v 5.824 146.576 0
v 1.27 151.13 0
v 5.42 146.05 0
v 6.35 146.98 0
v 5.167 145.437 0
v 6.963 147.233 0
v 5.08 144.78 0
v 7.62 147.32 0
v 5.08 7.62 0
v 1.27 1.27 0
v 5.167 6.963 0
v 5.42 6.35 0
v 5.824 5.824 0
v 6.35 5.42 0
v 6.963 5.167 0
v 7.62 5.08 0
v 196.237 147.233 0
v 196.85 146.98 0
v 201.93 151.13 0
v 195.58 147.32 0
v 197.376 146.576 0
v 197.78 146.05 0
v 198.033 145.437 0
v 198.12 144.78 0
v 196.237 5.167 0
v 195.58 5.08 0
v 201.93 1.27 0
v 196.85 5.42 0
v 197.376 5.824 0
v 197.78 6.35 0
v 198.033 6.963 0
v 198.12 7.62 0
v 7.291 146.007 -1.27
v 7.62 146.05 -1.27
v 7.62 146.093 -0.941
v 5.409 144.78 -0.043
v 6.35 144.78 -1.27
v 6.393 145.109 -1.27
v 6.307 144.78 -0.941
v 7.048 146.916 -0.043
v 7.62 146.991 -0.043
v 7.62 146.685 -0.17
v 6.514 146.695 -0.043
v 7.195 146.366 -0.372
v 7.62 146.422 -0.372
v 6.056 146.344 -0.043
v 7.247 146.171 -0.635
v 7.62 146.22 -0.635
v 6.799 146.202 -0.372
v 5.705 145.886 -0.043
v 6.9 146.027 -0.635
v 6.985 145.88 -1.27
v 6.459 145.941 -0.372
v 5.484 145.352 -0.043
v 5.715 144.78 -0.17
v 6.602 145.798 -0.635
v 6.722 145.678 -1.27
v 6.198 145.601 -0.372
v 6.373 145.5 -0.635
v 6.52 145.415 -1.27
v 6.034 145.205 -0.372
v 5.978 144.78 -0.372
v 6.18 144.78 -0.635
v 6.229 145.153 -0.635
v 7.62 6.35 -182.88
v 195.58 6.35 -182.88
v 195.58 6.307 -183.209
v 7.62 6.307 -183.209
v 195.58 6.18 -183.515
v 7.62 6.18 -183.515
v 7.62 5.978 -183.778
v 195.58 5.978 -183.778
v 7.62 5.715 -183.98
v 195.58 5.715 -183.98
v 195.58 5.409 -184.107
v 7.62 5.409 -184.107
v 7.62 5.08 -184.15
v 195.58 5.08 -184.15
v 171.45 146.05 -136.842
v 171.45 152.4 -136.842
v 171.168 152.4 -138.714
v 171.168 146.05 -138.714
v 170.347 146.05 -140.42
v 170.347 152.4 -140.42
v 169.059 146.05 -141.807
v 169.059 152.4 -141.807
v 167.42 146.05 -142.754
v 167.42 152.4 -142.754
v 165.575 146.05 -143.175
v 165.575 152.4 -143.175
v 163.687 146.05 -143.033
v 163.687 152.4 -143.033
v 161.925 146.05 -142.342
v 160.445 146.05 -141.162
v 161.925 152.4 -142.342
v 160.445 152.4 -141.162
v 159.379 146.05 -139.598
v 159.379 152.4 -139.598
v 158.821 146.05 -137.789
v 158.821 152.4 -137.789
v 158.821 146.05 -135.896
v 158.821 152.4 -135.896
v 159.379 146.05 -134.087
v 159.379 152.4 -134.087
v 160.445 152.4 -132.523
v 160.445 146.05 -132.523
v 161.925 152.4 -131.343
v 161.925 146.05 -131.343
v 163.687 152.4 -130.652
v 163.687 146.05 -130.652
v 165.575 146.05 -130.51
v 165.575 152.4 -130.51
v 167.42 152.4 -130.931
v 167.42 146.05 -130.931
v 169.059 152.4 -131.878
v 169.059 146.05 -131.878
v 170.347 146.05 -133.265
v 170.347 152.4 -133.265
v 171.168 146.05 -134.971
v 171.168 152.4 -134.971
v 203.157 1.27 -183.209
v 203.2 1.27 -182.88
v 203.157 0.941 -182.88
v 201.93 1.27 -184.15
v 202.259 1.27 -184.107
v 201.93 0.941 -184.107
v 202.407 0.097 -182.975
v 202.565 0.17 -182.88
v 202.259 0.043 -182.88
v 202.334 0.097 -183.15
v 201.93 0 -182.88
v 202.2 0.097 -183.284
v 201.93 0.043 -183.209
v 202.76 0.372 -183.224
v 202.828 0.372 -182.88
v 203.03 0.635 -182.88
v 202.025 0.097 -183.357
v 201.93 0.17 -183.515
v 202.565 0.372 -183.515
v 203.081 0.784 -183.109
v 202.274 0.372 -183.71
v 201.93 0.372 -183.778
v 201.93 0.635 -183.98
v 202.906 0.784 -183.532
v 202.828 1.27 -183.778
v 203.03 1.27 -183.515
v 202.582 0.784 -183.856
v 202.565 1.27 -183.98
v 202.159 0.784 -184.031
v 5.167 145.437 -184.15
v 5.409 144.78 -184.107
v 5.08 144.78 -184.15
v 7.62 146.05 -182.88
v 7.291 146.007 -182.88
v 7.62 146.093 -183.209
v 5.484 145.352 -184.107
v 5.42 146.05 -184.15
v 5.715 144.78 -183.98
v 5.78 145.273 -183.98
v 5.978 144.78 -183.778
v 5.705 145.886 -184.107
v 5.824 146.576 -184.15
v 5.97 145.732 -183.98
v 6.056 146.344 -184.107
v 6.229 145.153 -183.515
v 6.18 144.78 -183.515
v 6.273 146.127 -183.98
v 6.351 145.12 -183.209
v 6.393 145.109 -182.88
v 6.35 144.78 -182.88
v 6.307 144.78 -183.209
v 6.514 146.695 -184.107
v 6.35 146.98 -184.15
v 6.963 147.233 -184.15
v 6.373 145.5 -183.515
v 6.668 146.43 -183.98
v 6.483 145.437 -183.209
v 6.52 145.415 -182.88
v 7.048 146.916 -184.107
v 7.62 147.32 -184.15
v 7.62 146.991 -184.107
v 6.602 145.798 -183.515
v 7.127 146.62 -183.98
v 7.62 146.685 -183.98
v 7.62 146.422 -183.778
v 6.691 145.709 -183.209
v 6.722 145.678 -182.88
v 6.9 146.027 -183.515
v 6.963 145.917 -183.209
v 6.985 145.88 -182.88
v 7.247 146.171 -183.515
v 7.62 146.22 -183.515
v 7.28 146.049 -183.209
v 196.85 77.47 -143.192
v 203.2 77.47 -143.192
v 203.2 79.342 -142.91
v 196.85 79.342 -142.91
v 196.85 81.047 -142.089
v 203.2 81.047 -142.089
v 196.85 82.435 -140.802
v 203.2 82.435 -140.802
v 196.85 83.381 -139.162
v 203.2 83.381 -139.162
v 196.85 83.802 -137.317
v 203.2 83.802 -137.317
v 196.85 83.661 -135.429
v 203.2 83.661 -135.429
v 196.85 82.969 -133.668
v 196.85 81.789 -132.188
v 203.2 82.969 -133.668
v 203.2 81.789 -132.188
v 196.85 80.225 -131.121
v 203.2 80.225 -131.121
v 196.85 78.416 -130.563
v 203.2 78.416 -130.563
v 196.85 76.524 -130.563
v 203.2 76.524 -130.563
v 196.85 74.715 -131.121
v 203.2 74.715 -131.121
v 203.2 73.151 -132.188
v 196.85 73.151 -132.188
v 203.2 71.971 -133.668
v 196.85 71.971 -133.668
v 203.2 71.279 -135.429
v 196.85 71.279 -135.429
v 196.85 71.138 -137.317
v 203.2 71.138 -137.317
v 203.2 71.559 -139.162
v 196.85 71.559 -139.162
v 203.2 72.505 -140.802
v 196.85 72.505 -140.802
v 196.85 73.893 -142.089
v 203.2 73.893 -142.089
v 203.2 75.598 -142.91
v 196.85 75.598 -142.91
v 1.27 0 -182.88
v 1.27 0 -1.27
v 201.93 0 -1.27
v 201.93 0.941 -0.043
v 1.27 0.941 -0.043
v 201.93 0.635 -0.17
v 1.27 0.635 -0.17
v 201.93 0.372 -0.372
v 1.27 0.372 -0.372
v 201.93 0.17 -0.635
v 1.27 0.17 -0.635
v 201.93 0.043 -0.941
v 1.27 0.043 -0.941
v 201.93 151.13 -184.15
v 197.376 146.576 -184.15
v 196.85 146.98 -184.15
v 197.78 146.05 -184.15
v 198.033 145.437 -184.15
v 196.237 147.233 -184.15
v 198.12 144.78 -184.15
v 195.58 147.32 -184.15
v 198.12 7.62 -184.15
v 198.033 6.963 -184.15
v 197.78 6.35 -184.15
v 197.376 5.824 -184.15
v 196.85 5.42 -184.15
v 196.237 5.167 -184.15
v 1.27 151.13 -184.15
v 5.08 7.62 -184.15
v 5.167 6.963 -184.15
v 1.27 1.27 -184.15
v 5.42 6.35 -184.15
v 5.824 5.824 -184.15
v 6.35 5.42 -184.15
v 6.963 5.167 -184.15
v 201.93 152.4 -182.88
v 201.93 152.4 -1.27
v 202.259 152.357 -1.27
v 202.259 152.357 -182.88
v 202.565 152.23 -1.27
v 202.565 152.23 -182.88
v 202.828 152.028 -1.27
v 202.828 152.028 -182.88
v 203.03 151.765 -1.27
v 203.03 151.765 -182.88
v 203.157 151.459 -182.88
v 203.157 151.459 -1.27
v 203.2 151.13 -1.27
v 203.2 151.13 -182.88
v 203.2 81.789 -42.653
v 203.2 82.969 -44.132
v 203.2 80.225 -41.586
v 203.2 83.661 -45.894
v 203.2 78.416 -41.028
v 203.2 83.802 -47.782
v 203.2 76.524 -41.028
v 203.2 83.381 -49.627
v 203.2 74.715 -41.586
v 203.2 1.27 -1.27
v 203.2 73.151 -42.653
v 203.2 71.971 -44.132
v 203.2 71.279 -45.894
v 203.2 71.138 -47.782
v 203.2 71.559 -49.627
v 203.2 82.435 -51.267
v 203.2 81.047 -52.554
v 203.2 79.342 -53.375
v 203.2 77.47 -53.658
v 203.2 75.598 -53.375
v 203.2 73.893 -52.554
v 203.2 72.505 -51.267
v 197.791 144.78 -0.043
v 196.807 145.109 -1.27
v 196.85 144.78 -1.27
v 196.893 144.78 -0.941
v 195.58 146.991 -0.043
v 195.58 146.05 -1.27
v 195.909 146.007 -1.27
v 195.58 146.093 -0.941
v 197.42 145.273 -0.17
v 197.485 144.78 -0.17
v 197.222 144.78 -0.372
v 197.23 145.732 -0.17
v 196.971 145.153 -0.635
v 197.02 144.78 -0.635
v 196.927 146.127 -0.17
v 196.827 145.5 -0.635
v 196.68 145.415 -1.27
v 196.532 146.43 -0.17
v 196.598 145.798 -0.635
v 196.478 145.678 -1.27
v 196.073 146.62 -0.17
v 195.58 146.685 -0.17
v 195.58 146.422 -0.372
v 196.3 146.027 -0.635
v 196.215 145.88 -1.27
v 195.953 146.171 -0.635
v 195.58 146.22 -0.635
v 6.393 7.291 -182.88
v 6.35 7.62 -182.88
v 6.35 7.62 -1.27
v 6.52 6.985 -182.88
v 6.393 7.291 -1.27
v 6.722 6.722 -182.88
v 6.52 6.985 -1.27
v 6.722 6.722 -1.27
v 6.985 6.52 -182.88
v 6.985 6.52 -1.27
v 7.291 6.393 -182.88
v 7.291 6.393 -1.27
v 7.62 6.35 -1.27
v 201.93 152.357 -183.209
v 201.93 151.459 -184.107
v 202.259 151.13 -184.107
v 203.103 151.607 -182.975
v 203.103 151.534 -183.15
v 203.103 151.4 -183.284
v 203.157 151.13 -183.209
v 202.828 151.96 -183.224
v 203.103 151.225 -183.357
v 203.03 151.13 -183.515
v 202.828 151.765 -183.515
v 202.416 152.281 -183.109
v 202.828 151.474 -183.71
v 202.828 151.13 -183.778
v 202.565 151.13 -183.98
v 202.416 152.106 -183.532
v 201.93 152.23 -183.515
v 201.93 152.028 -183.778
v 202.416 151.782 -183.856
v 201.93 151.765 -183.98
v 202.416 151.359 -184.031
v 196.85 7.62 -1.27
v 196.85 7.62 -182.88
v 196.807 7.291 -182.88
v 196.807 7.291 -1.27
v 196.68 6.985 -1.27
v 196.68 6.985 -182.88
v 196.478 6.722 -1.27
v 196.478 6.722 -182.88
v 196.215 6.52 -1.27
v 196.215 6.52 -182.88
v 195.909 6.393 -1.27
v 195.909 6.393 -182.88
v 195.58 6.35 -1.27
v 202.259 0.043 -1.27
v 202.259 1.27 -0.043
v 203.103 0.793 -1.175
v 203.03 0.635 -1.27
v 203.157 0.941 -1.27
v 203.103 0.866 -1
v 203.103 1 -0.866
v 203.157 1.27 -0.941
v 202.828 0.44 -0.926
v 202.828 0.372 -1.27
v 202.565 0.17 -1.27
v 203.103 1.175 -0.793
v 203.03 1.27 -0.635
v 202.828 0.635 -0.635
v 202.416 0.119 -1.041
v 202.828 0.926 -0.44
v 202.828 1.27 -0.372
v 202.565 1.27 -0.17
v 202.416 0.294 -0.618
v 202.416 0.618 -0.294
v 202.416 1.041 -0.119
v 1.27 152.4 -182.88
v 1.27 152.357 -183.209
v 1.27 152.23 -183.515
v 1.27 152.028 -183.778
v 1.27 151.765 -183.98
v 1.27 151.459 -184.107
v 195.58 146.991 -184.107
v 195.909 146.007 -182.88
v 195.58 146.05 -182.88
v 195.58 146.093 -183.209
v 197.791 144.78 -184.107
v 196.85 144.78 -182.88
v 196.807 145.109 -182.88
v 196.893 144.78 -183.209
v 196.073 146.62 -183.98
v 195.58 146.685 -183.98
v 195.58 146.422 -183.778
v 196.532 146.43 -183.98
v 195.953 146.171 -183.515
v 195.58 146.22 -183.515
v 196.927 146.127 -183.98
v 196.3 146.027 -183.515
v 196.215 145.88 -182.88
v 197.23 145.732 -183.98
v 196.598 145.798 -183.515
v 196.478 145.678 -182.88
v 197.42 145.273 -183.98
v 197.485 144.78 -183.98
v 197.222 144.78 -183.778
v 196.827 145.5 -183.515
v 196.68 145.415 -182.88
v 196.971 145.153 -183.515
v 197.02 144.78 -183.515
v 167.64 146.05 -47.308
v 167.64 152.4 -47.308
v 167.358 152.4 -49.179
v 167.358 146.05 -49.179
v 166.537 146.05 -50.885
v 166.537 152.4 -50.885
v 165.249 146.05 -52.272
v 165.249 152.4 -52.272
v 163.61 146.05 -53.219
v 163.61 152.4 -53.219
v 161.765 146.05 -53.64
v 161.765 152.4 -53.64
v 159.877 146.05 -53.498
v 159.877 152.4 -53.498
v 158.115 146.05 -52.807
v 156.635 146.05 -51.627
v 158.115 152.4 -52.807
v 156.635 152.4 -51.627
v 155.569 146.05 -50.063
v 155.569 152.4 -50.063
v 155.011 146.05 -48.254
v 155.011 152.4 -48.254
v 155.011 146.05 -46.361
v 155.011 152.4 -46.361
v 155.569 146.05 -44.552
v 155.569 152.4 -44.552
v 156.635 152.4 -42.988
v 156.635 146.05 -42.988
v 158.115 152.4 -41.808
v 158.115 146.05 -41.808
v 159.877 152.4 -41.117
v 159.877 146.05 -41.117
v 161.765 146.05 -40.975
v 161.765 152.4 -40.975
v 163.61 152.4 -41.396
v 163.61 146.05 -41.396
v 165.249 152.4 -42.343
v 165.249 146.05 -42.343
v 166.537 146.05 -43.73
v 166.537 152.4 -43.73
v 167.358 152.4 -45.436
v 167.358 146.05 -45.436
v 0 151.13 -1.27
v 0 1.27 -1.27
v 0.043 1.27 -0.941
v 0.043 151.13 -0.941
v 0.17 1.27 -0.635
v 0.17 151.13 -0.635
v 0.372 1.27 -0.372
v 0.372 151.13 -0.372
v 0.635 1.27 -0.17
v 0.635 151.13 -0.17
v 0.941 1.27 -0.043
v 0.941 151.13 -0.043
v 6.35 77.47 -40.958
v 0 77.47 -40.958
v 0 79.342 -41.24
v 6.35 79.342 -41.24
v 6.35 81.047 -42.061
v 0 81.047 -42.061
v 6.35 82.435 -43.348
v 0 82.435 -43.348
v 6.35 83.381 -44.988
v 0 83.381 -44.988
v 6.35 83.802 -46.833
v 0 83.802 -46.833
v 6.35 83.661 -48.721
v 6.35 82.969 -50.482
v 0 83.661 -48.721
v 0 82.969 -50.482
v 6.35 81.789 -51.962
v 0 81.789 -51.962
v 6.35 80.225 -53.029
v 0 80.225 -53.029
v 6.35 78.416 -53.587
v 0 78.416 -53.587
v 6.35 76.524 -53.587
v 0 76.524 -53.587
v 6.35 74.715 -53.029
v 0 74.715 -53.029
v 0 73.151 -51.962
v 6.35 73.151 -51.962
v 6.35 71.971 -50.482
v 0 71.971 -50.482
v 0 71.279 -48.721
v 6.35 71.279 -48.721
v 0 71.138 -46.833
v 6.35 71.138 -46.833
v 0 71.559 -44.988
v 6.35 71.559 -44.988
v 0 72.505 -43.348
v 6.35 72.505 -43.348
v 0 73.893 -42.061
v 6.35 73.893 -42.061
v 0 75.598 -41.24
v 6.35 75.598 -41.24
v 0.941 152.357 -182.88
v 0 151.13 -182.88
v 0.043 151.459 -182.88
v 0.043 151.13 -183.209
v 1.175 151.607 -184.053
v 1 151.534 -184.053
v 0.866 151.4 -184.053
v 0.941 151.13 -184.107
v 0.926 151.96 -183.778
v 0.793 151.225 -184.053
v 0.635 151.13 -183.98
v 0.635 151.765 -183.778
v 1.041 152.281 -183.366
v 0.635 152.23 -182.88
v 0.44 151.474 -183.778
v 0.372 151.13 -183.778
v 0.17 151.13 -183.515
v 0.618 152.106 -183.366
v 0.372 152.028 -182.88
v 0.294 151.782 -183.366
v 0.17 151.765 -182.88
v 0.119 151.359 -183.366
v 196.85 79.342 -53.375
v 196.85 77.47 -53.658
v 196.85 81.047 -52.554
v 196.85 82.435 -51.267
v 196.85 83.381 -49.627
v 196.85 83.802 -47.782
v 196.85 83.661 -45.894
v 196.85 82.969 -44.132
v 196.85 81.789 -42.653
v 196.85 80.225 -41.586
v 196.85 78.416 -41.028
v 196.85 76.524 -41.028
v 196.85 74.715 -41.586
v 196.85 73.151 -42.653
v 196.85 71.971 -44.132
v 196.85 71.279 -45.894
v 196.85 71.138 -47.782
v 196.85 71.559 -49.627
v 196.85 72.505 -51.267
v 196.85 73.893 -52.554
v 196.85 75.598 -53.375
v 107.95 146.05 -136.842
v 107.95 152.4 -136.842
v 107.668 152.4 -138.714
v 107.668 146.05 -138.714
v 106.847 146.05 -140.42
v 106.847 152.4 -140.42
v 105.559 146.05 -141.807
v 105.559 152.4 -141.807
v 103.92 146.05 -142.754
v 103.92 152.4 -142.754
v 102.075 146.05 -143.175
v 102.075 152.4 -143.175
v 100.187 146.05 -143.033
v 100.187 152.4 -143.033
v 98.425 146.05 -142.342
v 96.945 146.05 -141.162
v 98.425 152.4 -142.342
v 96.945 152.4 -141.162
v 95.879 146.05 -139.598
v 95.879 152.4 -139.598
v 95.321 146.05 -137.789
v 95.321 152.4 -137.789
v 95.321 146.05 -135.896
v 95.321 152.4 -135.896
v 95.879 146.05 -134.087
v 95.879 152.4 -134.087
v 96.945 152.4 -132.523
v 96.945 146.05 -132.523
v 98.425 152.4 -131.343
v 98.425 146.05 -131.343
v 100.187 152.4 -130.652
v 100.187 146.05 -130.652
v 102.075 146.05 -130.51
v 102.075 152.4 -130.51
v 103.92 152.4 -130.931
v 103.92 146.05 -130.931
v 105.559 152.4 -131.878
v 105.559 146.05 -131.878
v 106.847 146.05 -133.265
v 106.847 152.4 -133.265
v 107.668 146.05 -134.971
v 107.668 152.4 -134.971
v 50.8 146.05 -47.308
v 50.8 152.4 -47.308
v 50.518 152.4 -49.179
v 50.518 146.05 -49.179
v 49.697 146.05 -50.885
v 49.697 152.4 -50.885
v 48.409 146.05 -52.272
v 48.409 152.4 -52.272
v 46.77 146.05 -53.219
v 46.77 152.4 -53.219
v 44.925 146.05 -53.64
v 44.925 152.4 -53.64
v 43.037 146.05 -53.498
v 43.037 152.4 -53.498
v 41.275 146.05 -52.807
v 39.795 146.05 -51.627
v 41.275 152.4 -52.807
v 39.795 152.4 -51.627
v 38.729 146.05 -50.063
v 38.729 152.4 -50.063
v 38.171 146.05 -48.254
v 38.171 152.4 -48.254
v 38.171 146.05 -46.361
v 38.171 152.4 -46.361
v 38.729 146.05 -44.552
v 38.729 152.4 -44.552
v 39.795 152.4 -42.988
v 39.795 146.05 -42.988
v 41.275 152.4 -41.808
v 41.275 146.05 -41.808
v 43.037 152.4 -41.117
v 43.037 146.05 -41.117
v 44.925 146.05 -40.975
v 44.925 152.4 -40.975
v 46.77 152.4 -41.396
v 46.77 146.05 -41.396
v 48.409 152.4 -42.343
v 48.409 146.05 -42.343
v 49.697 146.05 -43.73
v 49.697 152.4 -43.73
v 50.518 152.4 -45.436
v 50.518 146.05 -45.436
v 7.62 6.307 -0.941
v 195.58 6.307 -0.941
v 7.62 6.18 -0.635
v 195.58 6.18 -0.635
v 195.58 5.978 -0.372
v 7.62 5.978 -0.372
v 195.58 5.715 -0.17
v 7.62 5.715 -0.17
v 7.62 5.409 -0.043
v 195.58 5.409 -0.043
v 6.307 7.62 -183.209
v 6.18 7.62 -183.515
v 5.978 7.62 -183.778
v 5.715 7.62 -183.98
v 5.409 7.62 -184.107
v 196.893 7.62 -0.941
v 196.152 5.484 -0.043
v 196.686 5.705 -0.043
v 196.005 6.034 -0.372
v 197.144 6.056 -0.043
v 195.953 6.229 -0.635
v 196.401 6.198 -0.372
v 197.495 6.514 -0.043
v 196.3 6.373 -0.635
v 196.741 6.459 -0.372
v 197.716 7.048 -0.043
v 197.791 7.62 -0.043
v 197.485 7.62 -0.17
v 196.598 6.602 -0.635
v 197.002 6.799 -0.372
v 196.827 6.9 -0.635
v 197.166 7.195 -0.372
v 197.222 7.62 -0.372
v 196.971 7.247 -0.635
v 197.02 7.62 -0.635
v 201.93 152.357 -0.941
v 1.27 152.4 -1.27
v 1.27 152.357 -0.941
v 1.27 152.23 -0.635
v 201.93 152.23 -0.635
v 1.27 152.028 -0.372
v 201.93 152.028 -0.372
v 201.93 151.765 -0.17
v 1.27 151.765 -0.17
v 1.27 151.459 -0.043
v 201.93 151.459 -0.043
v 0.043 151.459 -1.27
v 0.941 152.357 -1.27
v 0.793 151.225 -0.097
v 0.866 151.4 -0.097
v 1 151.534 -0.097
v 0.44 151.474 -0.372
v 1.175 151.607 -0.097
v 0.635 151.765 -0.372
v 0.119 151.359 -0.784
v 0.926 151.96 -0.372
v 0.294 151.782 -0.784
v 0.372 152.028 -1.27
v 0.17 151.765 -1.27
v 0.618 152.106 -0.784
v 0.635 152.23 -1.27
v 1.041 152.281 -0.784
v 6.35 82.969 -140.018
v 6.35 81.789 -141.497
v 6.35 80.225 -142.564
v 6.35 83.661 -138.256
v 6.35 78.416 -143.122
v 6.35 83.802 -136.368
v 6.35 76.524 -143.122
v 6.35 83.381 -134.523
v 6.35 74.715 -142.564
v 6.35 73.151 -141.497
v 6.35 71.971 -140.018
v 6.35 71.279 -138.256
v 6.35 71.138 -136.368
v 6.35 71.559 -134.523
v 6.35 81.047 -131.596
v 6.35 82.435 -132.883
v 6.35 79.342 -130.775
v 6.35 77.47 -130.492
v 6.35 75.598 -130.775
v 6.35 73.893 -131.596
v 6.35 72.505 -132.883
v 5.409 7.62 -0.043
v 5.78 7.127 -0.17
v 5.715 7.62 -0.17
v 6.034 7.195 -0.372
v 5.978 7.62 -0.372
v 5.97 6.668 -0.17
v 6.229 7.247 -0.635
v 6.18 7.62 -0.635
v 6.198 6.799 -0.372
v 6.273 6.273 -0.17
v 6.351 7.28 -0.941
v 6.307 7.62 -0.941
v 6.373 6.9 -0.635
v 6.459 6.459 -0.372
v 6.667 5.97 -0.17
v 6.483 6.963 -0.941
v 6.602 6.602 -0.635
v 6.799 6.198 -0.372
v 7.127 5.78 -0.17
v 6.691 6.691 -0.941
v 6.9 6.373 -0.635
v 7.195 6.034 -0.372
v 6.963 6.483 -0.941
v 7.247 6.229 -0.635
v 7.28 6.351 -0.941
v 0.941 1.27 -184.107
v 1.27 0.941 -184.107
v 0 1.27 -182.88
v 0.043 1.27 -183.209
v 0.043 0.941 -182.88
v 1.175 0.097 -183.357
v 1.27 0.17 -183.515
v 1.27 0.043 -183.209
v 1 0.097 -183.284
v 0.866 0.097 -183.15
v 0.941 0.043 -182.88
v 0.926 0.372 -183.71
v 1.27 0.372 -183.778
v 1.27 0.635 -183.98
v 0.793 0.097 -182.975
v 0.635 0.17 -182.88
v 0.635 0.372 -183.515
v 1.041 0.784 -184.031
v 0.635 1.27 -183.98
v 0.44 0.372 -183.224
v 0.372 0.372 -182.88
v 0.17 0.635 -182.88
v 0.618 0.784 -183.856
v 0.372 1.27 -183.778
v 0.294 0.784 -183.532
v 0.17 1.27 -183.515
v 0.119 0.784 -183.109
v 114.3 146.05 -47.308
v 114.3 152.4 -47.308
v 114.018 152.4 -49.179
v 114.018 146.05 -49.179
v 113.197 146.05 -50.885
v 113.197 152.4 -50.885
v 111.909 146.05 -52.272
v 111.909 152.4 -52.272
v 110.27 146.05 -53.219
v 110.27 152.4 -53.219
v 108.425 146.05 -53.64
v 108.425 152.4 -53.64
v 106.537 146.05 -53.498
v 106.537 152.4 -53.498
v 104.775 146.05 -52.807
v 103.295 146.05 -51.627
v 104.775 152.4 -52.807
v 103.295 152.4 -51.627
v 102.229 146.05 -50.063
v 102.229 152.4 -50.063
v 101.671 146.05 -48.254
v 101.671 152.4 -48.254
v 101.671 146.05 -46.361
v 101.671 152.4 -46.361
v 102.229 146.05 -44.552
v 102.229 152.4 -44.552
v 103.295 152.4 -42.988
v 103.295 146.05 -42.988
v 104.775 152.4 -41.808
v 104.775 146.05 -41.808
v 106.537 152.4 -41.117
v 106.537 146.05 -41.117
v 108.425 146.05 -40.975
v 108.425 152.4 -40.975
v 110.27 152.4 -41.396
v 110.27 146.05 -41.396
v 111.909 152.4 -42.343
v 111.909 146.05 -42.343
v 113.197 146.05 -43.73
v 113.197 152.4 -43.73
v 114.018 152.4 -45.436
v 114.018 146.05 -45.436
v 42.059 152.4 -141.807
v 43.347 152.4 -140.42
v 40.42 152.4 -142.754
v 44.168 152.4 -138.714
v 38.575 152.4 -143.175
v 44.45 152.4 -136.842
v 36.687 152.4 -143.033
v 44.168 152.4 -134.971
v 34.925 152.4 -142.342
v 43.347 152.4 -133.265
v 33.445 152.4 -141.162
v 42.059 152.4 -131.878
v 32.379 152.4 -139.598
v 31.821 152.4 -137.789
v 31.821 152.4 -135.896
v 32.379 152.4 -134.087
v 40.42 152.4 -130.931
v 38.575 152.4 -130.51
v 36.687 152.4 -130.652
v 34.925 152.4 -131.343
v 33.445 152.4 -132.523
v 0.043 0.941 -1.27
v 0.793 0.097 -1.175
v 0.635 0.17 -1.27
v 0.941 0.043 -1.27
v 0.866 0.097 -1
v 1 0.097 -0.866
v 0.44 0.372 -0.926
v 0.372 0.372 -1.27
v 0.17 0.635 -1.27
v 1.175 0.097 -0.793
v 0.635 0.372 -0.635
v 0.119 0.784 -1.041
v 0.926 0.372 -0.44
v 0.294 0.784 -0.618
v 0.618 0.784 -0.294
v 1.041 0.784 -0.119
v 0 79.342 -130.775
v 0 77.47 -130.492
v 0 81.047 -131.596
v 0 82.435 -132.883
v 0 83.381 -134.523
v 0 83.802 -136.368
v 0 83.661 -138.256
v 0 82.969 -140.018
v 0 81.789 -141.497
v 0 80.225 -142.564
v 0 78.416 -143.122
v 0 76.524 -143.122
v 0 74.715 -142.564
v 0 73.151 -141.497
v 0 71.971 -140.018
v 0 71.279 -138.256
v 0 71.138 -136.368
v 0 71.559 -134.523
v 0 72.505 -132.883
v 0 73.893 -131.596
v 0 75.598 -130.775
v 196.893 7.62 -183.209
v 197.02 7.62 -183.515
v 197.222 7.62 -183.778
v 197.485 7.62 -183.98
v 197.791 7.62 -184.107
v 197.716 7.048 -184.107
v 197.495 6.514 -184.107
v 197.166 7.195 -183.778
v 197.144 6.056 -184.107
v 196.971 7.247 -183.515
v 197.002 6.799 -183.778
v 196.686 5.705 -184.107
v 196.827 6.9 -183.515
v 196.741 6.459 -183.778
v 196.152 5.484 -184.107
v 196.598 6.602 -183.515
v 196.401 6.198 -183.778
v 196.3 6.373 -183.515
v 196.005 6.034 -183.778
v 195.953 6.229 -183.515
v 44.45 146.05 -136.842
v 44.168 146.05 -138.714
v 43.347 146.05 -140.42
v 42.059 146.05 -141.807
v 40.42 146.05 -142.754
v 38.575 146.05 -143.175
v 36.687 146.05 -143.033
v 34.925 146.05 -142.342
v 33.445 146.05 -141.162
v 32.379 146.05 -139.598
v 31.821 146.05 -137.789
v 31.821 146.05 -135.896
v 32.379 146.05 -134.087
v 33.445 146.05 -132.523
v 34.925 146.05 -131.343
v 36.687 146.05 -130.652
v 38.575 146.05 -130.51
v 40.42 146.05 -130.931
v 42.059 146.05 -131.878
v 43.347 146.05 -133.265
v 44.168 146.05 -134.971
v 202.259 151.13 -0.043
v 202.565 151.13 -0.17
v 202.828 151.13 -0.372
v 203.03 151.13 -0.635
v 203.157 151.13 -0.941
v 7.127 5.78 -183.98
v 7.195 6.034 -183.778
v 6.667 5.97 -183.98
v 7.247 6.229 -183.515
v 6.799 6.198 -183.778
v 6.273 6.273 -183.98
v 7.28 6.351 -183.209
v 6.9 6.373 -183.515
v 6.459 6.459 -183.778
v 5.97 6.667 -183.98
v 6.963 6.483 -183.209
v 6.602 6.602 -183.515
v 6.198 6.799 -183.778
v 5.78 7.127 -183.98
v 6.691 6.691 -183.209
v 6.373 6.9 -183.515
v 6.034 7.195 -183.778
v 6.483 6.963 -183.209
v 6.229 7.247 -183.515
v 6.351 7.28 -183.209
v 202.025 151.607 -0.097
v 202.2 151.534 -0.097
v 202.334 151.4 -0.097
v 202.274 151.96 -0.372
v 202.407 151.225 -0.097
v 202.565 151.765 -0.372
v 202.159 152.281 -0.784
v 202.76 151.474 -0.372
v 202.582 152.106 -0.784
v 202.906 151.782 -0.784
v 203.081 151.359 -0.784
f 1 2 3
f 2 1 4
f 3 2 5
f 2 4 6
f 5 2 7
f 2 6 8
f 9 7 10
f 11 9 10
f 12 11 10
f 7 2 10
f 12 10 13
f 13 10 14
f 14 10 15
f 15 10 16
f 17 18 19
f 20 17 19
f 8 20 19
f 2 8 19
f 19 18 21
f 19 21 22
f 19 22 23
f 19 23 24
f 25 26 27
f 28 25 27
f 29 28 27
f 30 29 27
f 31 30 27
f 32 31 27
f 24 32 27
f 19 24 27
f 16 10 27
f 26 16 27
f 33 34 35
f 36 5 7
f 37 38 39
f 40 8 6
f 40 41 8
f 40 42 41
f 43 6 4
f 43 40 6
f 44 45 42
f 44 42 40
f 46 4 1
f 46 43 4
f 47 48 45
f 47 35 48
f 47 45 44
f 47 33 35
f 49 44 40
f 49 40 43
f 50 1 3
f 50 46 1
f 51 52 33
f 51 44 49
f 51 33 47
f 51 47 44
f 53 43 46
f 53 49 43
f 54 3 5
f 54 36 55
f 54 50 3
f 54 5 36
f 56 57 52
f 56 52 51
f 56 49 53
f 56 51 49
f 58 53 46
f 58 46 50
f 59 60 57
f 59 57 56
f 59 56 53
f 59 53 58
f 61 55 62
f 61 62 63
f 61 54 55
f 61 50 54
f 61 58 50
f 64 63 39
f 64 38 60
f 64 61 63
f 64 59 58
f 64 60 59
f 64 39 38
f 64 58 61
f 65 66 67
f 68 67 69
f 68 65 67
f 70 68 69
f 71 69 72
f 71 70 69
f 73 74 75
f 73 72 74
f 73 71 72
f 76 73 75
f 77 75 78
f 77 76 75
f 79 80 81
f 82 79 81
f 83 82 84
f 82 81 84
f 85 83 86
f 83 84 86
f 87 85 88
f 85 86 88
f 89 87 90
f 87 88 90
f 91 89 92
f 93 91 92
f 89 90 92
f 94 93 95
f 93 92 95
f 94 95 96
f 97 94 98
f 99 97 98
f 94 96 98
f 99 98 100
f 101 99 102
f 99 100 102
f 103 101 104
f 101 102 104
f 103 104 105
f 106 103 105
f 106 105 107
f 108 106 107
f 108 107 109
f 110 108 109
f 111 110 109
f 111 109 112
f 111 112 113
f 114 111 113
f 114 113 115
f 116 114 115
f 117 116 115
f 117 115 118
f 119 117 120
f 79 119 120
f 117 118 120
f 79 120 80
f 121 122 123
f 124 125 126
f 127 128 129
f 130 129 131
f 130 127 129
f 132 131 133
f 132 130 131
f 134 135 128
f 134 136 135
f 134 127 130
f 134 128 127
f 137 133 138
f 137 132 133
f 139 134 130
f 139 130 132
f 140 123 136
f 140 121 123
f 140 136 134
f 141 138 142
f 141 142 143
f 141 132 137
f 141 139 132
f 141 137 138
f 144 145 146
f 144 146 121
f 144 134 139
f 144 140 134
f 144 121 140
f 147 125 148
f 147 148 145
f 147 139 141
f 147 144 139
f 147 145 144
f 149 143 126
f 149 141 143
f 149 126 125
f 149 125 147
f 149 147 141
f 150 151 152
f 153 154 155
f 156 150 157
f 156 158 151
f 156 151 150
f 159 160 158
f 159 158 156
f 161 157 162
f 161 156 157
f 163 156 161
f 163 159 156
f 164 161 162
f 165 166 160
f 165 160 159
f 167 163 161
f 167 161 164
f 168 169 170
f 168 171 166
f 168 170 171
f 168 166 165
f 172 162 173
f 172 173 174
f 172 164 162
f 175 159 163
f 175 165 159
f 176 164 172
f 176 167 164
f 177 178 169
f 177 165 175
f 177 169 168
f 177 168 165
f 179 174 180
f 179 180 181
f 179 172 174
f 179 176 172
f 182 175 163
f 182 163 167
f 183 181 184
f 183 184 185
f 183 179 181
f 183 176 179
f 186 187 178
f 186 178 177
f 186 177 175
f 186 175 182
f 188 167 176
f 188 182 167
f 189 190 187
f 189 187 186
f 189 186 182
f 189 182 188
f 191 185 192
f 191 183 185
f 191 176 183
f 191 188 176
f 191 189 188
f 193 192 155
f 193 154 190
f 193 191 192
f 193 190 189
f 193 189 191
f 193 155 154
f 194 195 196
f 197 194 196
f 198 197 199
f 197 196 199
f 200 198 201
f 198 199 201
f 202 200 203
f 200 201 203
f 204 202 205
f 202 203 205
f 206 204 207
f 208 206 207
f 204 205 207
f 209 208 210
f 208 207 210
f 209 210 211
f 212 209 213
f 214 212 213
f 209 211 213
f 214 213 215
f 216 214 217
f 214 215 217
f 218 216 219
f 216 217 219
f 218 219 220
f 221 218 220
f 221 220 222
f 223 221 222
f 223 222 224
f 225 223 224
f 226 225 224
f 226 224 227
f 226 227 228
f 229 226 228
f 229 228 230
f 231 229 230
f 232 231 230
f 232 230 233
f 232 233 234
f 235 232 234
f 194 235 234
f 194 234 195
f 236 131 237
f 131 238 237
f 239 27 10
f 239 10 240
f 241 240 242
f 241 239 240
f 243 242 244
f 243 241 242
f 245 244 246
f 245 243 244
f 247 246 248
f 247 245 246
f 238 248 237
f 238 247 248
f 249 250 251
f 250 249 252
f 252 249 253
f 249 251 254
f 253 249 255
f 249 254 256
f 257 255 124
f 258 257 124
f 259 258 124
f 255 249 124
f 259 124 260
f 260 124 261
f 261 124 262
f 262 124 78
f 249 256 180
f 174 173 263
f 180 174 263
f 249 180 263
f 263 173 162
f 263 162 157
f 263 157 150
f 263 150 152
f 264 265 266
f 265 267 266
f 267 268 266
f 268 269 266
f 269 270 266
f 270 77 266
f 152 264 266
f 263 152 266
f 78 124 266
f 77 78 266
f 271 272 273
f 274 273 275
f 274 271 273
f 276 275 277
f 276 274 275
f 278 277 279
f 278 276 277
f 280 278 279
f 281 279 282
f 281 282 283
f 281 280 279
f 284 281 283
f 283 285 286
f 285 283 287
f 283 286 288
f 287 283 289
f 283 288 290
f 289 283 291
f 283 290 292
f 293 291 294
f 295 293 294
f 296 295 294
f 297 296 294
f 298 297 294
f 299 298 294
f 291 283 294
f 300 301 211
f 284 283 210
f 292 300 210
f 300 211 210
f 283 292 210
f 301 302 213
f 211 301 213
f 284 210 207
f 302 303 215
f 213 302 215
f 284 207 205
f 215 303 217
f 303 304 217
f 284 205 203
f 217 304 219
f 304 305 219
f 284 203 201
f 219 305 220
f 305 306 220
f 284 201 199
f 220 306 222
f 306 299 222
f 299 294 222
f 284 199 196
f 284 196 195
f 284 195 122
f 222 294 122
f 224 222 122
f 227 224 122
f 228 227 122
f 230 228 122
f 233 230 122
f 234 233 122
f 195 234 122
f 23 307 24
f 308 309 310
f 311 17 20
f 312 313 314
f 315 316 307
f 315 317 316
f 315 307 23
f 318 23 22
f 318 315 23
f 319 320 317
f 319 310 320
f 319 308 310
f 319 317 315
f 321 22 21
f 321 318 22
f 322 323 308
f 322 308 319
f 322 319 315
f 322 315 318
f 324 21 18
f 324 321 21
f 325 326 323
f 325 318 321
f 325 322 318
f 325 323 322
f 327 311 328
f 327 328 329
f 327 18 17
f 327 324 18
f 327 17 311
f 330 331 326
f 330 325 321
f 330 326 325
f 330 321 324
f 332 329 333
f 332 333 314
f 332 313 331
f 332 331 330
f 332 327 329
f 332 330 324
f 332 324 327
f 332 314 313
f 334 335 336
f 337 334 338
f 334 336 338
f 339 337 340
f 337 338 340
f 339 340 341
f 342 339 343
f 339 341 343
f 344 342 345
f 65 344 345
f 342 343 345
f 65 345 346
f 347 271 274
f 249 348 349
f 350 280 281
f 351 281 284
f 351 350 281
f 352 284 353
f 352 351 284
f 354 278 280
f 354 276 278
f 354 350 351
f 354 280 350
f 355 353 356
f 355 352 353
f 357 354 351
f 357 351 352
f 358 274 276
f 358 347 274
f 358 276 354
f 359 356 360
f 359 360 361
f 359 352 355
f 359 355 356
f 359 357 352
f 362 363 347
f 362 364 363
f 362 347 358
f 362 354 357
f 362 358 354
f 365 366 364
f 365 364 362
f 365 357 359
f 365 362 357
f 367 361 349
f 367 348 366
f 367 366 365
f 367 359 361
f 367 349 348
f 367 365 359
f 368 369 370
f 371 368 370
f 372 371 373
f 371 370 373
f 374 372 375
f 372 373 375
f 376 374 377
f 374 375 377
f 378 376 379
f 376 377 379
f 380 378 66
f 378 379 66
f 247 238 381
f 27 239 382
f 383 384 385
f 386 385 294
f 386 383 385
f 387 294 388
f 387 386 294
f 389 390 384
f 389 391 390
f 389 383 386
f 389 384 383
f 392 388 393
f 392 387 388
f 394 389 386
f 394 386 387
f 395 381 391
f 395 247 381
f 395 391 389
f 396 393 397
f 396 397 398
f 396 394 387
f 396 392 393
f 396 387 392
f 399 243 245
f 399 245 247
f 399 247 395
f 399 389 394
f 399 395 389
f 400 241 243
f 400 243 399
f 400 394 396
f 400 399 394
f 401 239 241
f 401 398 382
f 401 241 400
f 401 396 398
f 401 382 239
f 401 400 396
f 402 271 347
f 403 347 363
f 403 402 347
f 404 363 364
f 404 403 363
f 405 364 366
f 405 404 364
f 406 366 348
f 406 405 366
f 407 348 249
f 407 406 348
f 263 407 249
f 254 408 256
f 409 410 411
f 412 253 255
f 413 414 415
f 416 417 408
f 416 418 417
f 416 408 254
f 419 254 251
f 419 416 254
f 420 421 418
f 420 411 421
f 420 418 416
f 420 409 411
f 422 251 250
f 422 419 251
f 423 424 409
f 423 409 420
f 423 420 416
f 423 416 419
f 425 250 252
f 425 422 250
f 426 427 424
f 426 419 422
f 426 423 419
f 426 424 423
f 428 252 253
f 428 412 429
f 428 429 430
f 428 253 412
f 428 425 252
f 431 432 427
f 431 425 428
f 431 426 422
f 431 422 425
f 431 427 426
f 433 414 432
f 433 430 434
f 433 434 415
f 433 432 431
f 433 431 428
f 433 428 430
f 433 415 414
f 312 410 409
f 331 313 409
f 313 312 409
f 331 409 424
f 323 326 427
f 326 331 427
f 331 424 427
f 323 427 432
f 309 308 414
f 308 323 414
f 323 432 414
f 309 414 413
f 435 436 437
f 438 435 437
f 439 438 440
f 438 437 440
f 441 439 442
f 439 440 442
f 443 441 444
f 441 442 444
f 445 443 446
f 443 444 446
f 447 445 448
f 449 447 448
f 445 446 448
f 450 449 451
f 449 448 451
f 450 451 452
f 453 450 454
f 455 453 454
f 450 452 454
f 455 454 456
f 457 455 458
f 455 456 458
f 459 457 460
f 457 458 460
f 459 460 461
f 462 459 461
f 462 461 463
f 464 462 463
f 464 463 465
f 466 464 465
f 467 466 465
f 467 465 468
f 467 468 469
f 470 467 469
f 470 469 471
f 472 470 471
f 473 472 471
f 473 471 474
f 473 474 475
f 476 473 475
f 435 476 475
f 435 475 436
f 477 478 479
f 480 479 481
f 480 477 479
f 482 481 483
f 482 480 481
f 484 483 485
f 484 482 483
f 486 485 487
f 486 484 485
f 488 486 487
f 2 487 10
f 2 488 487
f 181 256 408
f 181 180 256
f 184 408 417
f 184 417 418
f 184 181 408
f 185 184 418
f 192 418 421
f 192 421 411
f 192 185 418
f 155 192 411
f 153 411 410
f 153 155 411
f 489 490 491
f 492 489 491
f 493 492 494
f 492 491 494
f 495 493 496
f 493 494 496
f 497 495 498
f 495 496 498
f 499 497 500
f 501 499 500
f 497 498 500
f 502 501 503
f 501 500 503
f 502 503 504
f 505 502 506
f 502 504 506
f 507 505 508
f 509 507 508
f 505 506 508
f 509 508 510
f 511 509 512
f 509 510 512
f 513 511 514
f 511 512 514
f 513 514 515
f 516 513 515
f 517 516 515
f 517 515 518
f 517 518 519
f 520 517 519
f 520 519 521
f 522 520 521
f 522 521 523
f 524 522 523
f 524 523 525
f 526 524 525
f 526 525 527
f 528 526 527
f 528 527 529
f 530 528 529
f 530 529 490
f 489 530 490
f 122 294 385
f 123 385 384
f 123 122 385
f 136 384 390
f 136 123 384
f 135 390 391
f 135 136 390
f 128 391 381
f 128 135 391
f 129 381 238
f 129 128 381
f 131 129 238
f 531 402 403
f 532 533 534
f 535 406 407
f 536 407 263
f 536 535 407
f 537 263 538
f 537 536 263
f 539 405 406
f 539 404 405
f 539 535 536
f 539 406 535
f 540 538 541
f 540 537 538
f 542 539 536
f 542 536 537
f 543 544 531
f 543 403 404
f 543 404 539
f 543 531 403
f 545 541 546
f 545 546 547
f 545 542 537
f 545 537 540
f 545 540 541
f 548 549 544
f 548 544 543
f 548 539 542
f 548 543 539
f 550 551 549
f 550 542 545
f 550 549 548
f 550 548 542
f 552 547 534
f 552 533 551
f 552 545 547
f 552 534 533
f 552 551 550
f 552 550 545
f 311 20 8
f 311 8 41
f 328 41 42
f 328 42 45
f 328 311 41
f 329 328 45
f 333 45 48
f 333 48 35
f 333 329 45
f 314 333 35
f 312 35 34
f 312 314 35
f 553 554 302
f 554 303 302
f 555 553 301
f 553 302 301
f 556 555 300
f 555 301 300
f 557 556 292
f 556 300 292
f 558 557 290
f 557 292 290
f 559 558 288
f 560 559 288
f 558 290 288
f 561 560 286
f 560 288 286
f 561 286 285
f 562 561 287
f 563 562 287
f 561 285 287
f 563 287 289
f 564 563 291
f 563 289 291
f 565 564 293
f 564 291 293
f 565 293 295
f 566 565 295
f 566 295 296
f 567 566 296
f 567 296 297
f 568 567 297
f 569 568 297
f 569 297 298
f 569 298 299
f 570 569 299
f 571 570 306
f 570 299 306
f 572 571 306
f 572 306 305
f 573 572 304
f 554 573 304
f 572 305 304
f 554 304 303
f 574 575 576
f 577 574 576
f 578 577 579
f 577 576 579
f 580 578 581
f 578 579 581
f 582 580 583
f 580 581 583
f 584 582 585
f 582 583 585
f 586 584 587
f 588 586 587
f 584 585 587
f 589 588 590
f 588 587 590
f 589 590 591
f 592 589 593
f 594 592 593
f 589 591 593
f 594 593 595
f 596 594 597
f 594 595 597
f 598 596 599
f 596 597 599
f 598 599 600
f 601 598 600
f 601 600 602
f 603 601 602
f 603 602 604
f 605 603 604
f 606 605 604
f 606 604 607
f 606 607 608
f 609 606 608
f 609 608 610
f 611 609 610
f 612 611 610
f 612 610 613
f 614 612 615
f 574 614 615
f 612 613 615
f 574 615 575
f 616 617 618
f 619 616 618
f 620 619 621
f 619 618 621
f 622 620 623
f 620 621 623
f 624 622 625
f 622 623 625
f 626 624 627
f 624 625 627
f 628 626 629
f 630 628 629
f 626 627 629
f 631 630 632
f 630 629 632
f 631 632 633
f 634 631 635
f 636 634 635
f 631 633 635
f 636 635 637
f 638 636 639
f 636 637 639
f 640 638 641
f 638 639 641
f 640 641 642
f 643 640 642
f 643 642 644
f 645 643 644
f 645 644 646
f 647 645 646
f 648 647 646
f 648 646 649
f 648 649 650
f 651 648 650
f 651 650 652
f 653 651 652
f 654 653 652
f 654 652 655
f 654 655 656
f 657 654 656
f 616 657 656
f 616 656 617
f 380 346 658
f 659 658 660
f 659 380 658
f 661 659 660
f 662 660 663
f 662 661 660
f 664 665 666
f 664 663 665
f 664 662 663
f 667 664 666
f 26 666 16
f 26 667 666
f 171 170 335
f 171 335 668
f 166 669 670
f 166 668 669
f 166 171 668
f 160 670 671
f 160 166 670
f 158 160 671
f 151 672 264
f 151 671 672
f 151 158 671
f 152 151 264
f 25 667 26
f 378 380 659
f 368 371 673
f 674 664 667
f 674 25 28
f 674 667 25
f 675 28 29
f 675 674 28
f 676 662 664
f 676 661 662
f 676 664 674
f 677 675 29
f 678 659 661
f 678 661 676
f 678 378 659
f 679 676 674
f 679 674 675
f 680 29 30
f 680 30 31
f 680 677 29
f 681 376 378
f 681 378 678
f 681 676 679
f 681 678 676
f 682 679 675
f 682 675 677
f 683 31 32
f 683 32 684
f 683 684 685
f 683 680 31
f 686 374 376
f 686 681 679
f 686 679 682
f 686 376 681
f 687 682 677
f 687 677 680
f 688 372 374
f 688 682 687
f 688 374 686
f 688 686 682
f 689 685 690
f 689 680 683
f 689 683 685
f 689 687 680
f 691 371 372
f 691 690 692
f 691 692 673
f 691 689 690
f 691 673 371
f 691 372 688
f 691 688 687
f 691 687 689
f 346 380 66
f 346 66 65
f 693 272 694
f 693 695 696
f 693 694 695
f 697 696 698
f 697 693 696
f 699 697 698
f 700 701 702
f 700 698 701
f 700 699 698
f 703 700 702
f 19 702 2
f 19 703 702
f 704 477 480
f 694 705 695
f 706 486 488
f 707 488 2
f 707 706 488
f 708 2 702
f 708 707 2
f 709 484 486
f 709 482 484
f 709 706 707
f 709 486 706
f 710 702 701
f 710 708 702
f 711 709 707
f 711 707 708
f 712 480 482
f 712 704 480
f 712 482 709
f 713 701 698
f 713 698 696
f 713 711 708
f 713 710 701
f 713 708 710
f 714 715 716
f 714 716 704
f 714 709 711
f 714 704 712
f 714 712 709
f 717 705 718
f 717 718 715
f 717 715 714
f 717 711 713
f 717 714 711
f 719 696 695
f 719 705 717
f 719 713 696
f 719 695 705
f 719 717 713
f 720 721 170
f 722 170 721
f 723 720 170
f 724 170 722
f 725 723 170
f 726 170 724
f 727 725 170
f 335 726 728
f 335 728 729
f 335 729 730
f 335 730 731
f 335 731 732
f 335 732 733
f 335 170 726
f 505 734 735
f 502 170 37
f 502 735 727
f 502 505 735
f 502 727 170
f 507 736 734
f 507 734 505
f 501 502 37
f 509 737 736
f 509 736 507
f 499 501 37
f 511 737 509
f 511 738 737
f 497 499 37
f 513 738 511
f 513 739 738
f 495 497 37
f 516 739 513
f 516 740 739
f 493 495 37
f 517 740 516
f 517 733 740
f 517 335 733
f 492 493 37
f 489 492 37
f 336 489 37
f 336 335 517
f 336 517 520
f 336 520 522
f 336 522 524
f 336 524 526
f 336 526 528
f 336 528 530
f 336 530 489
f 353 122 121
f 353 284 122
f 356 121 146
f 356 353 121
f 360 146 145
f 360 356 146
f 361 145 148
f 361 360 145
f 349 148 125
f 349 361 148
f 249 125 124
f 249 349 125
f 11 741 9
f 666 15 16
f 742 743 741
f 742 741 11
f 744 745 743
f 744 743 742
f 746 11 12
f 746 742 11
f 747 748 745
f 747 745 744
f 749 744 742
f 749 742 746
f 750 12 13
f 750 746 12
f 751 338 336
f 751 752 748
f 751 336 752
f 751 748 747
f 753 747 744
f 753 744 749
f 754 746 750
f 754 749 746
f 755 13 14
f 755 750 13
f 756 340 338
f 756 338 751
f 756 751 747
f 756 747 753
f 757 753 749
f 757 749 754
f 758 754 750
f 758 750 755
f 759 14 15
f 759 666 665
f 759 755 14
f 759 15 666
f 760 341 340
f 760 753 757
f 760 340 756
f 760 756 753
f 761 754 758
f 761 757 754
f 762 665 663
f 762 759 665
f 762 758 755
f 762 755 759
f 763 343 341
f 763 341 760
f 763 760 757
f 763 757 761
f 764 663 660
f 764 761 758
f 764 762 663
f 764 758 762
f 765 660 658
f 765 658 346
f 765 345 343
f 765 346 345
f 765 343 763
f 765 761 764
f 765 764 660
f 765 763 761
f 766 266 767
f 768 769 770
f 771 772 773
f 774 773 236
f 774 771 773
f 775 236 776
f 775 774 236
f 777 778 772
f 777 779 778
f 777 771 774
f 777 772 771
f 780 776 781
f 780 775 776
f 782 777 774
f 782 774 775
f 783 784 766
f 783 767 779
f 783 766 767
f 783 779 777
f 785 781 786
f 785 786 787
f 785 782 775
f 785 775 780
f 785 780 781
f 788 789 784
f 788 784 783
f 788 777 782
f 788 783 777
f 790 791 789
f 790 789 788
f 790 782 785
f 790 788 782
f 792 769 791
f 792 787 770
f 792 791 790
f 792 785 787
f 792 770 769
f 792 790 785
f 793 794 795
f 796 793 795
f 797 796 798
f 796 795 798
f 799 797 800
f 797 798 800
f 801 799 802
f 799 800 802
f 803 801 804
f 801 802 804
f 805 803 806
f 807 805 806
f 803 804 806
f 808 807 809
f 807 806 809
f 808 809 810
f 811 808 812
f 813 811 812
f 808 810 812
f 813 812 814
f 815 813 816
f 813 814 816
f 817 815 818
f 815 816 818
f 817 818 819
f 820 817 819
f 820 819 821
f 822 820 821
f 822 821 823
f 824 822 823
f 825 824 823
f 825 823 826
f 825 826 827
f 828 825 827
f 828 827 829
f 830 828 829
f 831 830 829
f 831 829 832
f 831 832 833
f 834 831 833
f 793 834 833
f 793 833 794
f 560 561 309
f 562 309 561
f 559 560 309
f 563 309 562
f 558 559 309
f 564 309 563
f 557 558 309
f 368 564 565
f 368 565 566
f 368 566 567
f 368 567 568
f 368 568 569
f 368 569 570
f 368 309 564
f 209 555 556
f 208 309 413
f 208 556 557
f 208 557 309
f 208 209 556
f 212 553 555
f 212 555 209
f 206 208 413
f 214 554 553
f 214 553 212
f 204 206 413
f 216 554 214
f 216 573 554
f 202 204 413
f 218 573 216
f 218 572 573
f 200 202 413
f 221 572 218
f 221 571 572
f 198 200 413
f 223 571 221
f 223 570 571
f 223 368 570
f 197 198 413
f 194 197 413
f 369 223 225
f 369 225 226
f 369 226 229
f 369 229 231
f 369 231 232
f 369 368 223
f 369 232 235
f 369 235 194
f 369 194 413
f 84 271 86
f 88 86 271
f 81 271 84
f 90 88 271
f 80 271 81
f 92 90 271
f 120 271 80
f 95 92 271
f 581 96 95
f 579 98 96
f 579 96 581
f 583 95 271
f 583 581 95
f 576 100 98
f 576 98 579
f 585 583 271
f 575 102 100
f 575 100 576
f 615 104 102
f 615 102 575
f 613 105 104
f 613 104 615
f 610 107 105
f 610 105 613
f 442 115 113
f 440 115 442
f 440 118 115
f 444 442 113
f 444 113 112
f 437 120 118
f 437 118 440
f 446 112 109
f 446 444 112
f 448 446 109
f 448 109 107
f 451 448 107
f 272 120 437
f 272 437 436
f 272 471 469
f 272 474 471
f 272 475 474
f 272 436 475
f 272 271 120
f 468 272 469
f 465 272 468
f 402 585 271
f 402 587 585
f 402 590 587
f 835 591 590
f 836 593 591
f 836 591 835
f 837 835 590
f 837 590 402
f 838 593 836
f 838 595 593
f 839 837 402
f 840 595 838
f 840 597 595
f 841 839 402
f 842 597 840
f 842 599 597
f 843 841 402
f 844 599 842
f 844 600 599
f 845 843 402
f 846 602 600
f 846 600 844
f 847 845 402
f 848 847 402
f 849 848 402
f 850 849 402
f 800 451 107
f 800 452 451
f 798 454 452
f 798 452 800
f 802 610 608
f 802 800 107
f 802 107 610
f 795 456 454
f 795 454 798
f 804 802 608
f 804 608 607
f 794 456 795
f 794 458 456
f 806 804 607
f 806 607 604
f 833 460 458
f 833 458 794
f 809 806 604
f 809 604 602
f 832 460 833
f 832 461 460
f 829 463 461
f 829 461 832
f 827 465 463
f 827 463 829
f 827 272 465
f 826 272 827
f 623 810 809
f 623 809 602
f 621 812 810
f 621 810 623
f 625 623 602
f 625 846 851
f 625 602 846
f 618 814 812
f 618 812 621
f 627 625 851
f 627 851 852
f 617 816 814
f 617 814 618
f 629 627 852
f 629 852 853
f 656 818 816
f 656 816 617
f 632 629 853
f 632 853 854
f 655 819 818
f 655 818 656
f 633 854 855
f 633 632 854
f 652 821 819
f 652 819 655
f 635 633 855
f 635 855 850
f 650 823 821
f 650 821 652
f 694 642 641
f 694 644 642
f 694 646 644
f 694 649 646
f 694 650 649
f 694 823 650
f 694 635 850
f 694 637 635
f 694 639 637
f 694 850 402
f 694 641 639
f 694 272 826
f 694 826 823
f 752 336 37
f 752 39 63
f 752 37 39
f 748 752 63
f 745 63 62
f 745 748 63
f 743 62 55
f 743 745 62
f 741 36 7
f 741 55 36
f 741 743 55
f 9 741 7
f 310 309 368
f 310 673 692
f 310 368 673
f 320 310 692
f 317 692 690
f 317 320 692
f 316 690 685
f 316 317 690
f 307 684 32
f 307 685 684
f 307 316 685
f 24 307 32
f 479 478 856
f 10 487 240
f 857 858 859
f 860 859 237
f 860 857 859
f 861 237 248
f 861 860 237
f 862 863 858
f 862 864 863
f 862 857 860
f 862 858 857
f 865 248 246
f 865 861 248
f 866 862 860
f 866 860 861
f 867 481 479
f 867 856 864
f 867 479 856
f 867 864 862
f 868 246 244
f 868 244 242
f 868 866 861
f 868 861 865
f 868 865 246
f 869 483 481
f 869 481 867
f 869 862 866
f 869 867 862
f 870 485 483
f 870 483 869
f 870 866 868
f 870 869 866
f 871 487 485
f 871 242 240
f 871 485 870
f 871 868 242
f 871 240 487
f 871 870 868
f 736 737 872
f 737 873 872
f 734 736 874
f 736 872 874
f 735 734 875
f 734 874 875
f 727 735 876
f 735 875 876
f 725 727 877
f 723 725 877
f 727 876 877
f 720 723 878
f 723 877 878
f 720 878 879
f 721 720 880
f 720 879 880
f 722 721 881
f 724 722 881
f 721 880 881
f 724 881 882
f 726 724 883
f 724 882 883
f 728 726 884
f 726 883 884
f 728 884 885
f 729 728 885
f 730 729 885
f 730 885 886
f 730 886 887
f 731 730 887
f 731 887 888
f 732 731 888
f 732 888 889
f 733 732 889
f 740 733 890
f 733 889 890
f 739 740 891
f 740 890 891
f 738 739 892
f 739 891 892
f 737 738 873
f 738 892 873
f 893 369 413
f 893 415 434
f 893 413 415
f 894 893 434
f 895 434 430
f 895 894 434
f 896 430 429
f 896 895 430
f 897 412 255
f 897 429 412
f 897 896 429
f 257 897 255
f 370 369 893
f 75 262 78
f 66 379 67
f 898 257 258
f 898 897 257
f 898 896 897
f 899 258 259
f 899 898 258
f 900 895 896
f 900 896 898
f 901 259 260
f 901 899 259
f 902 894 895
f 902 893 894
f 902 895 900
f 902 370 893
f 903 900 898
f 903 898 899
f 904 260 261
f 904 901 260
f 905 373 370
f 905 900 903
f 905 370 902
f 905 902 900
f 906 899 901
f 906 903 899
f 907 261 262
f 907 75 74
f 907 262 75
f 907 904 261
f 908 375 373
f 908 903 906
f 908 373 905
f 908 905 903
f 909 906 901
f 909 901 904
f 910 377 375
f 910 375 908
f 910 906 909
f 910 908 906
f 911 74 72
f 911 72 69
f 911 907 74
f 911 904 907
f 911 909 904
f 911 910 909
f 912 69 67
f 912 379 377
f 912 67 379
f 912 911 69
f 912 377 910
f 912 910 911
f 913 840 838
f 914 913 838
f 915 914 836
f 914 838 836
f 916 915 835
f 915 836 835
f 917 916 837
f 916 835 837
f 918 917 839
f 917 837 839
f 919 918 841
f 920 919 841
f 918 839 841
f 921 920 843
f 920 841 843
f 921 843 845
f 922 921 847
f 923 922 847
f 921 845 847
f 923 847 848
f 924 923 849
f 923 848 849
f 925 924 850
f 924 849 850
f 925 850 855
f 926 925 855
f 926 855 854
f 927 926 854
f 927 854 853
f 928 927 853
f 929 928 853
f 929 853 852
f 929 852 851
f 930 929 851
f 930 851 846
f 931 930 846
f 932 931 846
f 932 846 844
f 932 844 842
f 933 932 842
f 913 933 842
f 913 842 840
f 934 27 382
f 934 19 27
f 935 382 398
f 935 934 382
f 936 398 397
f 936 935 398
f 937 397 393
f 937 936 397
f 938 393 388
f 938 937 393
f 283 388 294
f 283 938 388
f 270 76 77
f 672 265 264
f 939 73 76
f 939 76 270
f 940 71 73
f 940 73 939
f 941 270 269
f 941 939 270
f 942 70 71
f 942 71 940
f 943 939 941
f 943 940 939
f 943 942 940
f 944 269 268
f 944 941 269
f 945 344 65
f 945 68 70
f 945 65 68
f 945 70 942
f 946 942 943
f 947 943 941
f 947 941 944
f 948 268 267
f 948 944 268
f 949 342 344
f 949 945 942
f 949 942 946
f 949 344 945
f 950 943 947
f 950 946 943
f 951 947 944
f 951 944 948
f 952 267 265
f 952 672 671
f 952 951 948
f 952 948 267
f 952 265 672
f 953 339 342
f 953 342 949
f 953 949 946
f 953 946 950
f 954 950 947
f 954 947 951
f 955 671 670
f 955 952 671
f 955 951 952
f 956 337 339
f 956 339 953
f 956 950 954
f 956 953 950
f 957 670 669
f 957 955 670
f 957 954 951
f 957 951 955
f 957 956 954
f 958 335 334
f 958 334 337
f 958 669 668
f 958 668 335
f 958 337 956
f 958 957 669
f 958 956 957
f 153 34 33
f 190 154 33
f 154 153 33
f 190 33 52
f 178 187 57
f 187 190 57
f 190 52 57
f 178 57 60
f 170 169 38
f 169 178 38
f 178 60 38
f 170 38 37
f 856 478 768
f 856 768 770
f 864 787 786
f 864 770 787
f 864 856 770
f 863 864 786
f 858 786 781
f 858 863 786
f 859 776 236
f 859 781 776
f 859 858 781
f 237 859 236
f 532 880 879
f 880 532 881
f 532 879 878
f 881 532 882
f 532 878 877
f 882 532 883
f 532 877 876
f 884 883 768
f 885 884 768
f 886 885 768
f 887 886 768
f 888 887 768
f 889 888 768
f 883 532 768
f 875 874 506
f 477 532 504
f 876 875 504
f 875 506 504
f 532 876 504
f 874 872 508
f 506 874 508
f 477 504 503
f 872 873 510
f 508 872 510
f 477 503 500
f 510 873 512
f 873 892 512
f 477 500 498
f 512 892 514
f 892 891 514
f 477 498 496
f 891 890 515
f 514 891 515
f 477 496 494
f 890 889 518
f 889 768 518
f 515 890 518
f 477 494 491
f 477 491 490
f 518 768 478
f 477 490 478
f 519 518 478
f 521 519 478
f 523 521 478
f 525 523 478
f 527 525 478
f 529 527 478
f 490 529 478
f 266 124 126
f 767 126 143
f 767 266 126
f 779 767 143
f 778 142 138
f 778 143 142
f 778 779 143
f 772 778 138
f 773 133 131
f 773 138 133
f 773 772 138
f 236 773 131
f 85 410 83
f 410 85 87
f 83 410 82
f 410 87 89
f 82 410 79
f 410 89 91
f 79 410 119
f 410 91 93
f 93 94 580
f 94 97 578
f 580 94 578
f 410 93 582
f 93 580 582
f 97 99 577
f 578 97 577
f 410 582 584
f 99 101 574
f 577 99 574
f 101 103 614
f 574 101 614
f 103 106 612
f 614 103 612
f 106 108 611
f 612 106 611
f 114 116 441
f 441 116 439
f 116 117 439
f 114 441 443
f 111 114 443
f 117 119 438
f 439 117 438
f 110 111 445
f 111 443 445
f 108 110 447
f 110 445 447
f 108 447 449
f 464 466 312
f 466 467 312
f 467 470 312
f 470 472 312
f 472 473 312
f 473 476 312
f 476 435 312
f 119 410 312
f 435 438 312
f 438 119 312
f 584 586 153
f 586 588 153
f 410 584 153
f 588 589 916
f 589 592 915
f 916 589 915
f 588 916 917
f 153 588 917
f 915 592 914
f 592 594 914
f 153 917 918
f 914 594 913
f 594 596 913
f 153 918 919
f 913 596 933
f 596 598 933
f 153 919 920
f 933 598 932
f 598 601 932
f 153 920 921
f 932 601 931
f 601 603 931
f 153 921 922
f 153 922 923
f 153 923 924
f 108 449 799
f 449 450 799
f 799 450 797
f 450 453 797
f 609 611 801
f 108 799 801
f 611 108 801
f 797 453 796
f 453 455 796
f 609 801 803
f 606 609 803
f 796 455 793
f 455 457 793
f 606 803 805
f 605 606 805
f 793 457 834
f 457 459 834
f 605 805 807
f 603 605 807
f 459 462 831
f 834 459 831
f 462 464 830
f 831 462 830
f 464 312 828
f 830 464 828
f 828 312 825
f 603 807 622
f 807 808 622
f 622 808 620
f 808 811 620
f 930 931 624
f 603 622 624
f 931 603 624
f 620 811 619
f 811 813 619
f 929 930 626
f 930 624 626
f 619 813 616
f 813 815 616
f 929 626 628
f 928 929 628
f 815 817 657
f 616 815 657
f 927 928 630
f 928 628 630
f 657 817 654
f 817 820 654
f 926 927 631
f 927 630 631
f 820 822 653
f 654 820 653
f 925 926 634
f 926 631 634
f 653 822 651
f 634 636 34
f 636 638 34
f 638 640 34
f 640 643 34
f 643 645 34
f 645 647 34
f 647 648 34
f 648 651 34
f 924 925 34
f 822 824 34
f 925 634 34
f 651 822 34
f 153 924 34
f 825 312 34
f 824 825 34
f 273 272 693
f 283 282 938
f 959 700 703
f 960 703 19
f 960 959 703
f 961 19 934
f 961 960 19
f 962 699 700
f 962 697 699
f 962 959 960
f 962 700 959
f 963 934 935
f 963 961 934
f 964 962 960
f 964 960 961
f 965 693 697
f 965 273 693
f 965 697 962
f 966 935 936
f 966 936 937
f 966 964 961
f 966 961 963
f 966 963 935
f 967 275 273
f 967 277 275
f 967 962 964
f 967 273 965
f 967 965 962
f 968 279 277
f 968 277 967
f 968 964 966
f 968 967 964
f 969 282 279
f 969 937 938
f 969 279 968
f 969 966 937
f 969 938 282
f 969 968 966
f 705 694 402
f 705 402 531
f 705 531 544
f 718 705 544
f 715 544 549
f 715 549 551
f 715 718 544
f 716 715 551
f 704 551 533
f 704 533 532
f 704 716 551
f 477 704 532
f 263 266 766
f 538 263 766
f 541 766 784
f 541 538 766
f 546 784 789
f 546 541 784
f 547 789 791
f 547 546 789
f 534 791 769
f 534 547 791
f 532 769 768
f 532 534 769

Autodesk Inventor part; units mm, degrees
ref_plane "YZ Plane" through (0, 0, 0) normal (1, 0, 0) x (0, 1, 0)
ref_plane "XZ Plane" through (0, 0, 0) normal (0, 1, 0) x (-1, 0, 0)
ref_plane "XY Plane" through (0, 0, 0) normal (0, 0, 1) x (1, 0, 0)
sketch "Sketch1" plane through (0, 0, 0) normal (0, 1, 0) x (-1, 0, 0)
  line L0 (0, 0) -> (-203.2, 0)
  line L1 (-203.2, 0) -> (-203.2, -184.15)
  line L2 (-203.2, -184.15) -> (0, -184.15)
  line L3 (0, -184.15) -> (0, 0)
  dimension "blength" = 203.2
  dimension "bwidth" = 184.15
extrude "Extrusion1" add sketch "Sketch1" along normal blind 152.4
shell "Shell1" thickness 6.35 removed faces 2 at (135.4667, 50.8, -184.15) at (67.7333, 50.8, 0)
fillet "Fillet1" radius 1.27 24 edges at (0, 152.4, -92.075) (101.6, 152.4, -184.15) (203.2, 152.4, -92.075) (101.6, 152.4, 0) (0, 76.2, -184.15) (6.35, 76.2, -184.15) (196.85, 76.2, -184.15) (101.6, 6.35, -184.15) (101.6, 146.05, -184.15) (203.2, 76.2, -184.15) (101.6, 0, -184.15) (6.35, 6.35, -92.075) (6.35, 146.05, -92.075) (196.85, 6.35, -92.075) (196.85, 146.05, -92.075) (6.35, 76.2, 0) (101.6, 6.35, 0) (196.85, 76.2, 0) (101.6, 146.05, 0) (0, 76.2, 0) (0, 0, -92.075) (101.6, 0, 0) (203.2, 76.2, 0) (203.2, 0, -92.075)
sketch "Sketch9" plane through (203.2, 1.27, -182.88) normal (1, 0, 0) x (0, 0, -1)
  line L0 (0, 0) -> (-181.61, 0)
  line L1 (0, 149.86) -> (0, 0)
  line L2 (-181.61, 0) -> (-181.61, 149.86)
  circle A0 centre (-135.5725, 76.2) radius 6.35
  circle A1 centre (-46.0375, 76.2) radius 6.35
  point P0 (-182.88, -1.27)
  dimension "csize" = 12.7
  dimension "d81" = 12.7
  dimension "d82" = 76.2
  dimension "d83" = 76.2
  dimension "d84" = 46.0375
  dimension "d85" = 46.0375
extrude "Extrusion6" cut sketch "Sketch9" against normal blind 6.35
sketch "Sketch10" plane through (0, 1.27, -1.27) normal (-1, 0, 0) x (0, 0, 1)
  line L0 (0, 0) -> (-181.61, 0)
  line L1 (0, 149.86) -> (0, 0)
  line L2 (-181.61, 0) -> (-181.61, 149.86)
  line L3 (0, 0) -> (-181.61, 0)
  line L4 (0, 149.86) -> (0, 0)
  line L5 (-181.61, 0) -> (-181.61, 149.86)
  circle A0 centre (-135.5725, 76.2) radius 6.35
  circle A1 centre (-46.0375, 76.2) radius 6.35
  point P0 (1.27, -1.27)
  point P1 (-182.88, -1.27)
  dimension "d106" = 12.7
  dimension "d107" = 12.7
  dimension "d108" = 46.0375
  dimension "d109" = 46.0375
  dimension "d110" = 76.2
  dimension "d111" = 76.2
sketch "Sketch11" plane through (0, 152.4, 0) normal (0, 1, 0) x (1, 0, 0)
  line L0 (201.93, 1.27) -> (1.27, 1.27)
  line L1 (201.93, 182.88) -> (201.93, 1.27)
  line L2 (1.27, 182.88) -> (201.93, 182.88)
  circle A0 centre (38.1, 136.8425) radius 6.35
  circle A1 centre (101.6, 136.8425) radius 6.35
  circle A2 centre (165.1, 136.8425) radius 6.35
  circle A3 centre (44.45, 47.3075) radius 6.35
  circle A4 centre (107.95, 47.3075) radius 6.35
  circle A5 centre (161.29, 47.3075) radius 6.35
  line L3 (1.27, 1.27) -> (1.27, 182.88)
  point P0 (0, 0)
  dimension "d112" = 12.7
  dimension "d113" = 12.7
  dimension "d114" = 12.7
  dimension "d115" = 46.0375
  dimension "d116" = 46.0375
  dimension "d117" = 46.0375
  dimension "d118" = 12.7
  dimension "d119" = 12.7
  dimension "d120" = 12.7
  dimension "d126" = 46.0375
  dimension "d127" = 46.0375
  dimension "d128" = 46.0375
  dimension "d134" = 40.64
  dimension "d135" = 106.68
extrude "Extrusion7" cut sketch "Sketch11" against normal blind 6.35 contours A0 | A1 | A2 | A3 | A4 | A5
extrude "Extrusion8" cut sketch "Sketch10" against normal blind 6.35
equation "\"d81\" = csize"
equation "\"d82\" = 0.5 * bheight"
equation "\"d83\" = 0.5 * bheight"
equation "\"d84\" = 0.25 * bwidth"
equation "\"d85\" = 0.25 * bwidth"
equation "\"d106\" = csize"
equation "\"d107\" = csize"
equation "\"d108\" = 0.25 * bwidth"
equation "\"d109\" = 0.25 * bwidth"
equation "\"d110\" = 0.5 * bheight"
equation "\"d111\" = 0.5 * bheight"
equation "\"d112\" = csize"
equation "\"d113\" = csize"
equation "\"d114\" = csize"
equation "\"d115\" = 0.25 * bwidth"
equation "\"d116\" = 0.25 * bwidth"
equation "\"d117\" = 0.25 * bwidth"
equation "\"d118\" = csize"
equation "\"d119\" = csize"
equation "\"d120\" = csize"
equation "\"d126\" = 0.25 * bwidth"
equation "\"d127\" = 0.25 * bwidth"
equation "\"d128\" = 0.25 * bwidth"
equation "\"d130\" = holeextrude"
equation "\"d132\" = holeextrude"
equation "\"topCircDistFromCntr\" = 0.2 * bwidth"
equation "\"bheight\" = 152.4"
equation "\"holeextrude\" = 6.35"
properties part number "Box Base"
